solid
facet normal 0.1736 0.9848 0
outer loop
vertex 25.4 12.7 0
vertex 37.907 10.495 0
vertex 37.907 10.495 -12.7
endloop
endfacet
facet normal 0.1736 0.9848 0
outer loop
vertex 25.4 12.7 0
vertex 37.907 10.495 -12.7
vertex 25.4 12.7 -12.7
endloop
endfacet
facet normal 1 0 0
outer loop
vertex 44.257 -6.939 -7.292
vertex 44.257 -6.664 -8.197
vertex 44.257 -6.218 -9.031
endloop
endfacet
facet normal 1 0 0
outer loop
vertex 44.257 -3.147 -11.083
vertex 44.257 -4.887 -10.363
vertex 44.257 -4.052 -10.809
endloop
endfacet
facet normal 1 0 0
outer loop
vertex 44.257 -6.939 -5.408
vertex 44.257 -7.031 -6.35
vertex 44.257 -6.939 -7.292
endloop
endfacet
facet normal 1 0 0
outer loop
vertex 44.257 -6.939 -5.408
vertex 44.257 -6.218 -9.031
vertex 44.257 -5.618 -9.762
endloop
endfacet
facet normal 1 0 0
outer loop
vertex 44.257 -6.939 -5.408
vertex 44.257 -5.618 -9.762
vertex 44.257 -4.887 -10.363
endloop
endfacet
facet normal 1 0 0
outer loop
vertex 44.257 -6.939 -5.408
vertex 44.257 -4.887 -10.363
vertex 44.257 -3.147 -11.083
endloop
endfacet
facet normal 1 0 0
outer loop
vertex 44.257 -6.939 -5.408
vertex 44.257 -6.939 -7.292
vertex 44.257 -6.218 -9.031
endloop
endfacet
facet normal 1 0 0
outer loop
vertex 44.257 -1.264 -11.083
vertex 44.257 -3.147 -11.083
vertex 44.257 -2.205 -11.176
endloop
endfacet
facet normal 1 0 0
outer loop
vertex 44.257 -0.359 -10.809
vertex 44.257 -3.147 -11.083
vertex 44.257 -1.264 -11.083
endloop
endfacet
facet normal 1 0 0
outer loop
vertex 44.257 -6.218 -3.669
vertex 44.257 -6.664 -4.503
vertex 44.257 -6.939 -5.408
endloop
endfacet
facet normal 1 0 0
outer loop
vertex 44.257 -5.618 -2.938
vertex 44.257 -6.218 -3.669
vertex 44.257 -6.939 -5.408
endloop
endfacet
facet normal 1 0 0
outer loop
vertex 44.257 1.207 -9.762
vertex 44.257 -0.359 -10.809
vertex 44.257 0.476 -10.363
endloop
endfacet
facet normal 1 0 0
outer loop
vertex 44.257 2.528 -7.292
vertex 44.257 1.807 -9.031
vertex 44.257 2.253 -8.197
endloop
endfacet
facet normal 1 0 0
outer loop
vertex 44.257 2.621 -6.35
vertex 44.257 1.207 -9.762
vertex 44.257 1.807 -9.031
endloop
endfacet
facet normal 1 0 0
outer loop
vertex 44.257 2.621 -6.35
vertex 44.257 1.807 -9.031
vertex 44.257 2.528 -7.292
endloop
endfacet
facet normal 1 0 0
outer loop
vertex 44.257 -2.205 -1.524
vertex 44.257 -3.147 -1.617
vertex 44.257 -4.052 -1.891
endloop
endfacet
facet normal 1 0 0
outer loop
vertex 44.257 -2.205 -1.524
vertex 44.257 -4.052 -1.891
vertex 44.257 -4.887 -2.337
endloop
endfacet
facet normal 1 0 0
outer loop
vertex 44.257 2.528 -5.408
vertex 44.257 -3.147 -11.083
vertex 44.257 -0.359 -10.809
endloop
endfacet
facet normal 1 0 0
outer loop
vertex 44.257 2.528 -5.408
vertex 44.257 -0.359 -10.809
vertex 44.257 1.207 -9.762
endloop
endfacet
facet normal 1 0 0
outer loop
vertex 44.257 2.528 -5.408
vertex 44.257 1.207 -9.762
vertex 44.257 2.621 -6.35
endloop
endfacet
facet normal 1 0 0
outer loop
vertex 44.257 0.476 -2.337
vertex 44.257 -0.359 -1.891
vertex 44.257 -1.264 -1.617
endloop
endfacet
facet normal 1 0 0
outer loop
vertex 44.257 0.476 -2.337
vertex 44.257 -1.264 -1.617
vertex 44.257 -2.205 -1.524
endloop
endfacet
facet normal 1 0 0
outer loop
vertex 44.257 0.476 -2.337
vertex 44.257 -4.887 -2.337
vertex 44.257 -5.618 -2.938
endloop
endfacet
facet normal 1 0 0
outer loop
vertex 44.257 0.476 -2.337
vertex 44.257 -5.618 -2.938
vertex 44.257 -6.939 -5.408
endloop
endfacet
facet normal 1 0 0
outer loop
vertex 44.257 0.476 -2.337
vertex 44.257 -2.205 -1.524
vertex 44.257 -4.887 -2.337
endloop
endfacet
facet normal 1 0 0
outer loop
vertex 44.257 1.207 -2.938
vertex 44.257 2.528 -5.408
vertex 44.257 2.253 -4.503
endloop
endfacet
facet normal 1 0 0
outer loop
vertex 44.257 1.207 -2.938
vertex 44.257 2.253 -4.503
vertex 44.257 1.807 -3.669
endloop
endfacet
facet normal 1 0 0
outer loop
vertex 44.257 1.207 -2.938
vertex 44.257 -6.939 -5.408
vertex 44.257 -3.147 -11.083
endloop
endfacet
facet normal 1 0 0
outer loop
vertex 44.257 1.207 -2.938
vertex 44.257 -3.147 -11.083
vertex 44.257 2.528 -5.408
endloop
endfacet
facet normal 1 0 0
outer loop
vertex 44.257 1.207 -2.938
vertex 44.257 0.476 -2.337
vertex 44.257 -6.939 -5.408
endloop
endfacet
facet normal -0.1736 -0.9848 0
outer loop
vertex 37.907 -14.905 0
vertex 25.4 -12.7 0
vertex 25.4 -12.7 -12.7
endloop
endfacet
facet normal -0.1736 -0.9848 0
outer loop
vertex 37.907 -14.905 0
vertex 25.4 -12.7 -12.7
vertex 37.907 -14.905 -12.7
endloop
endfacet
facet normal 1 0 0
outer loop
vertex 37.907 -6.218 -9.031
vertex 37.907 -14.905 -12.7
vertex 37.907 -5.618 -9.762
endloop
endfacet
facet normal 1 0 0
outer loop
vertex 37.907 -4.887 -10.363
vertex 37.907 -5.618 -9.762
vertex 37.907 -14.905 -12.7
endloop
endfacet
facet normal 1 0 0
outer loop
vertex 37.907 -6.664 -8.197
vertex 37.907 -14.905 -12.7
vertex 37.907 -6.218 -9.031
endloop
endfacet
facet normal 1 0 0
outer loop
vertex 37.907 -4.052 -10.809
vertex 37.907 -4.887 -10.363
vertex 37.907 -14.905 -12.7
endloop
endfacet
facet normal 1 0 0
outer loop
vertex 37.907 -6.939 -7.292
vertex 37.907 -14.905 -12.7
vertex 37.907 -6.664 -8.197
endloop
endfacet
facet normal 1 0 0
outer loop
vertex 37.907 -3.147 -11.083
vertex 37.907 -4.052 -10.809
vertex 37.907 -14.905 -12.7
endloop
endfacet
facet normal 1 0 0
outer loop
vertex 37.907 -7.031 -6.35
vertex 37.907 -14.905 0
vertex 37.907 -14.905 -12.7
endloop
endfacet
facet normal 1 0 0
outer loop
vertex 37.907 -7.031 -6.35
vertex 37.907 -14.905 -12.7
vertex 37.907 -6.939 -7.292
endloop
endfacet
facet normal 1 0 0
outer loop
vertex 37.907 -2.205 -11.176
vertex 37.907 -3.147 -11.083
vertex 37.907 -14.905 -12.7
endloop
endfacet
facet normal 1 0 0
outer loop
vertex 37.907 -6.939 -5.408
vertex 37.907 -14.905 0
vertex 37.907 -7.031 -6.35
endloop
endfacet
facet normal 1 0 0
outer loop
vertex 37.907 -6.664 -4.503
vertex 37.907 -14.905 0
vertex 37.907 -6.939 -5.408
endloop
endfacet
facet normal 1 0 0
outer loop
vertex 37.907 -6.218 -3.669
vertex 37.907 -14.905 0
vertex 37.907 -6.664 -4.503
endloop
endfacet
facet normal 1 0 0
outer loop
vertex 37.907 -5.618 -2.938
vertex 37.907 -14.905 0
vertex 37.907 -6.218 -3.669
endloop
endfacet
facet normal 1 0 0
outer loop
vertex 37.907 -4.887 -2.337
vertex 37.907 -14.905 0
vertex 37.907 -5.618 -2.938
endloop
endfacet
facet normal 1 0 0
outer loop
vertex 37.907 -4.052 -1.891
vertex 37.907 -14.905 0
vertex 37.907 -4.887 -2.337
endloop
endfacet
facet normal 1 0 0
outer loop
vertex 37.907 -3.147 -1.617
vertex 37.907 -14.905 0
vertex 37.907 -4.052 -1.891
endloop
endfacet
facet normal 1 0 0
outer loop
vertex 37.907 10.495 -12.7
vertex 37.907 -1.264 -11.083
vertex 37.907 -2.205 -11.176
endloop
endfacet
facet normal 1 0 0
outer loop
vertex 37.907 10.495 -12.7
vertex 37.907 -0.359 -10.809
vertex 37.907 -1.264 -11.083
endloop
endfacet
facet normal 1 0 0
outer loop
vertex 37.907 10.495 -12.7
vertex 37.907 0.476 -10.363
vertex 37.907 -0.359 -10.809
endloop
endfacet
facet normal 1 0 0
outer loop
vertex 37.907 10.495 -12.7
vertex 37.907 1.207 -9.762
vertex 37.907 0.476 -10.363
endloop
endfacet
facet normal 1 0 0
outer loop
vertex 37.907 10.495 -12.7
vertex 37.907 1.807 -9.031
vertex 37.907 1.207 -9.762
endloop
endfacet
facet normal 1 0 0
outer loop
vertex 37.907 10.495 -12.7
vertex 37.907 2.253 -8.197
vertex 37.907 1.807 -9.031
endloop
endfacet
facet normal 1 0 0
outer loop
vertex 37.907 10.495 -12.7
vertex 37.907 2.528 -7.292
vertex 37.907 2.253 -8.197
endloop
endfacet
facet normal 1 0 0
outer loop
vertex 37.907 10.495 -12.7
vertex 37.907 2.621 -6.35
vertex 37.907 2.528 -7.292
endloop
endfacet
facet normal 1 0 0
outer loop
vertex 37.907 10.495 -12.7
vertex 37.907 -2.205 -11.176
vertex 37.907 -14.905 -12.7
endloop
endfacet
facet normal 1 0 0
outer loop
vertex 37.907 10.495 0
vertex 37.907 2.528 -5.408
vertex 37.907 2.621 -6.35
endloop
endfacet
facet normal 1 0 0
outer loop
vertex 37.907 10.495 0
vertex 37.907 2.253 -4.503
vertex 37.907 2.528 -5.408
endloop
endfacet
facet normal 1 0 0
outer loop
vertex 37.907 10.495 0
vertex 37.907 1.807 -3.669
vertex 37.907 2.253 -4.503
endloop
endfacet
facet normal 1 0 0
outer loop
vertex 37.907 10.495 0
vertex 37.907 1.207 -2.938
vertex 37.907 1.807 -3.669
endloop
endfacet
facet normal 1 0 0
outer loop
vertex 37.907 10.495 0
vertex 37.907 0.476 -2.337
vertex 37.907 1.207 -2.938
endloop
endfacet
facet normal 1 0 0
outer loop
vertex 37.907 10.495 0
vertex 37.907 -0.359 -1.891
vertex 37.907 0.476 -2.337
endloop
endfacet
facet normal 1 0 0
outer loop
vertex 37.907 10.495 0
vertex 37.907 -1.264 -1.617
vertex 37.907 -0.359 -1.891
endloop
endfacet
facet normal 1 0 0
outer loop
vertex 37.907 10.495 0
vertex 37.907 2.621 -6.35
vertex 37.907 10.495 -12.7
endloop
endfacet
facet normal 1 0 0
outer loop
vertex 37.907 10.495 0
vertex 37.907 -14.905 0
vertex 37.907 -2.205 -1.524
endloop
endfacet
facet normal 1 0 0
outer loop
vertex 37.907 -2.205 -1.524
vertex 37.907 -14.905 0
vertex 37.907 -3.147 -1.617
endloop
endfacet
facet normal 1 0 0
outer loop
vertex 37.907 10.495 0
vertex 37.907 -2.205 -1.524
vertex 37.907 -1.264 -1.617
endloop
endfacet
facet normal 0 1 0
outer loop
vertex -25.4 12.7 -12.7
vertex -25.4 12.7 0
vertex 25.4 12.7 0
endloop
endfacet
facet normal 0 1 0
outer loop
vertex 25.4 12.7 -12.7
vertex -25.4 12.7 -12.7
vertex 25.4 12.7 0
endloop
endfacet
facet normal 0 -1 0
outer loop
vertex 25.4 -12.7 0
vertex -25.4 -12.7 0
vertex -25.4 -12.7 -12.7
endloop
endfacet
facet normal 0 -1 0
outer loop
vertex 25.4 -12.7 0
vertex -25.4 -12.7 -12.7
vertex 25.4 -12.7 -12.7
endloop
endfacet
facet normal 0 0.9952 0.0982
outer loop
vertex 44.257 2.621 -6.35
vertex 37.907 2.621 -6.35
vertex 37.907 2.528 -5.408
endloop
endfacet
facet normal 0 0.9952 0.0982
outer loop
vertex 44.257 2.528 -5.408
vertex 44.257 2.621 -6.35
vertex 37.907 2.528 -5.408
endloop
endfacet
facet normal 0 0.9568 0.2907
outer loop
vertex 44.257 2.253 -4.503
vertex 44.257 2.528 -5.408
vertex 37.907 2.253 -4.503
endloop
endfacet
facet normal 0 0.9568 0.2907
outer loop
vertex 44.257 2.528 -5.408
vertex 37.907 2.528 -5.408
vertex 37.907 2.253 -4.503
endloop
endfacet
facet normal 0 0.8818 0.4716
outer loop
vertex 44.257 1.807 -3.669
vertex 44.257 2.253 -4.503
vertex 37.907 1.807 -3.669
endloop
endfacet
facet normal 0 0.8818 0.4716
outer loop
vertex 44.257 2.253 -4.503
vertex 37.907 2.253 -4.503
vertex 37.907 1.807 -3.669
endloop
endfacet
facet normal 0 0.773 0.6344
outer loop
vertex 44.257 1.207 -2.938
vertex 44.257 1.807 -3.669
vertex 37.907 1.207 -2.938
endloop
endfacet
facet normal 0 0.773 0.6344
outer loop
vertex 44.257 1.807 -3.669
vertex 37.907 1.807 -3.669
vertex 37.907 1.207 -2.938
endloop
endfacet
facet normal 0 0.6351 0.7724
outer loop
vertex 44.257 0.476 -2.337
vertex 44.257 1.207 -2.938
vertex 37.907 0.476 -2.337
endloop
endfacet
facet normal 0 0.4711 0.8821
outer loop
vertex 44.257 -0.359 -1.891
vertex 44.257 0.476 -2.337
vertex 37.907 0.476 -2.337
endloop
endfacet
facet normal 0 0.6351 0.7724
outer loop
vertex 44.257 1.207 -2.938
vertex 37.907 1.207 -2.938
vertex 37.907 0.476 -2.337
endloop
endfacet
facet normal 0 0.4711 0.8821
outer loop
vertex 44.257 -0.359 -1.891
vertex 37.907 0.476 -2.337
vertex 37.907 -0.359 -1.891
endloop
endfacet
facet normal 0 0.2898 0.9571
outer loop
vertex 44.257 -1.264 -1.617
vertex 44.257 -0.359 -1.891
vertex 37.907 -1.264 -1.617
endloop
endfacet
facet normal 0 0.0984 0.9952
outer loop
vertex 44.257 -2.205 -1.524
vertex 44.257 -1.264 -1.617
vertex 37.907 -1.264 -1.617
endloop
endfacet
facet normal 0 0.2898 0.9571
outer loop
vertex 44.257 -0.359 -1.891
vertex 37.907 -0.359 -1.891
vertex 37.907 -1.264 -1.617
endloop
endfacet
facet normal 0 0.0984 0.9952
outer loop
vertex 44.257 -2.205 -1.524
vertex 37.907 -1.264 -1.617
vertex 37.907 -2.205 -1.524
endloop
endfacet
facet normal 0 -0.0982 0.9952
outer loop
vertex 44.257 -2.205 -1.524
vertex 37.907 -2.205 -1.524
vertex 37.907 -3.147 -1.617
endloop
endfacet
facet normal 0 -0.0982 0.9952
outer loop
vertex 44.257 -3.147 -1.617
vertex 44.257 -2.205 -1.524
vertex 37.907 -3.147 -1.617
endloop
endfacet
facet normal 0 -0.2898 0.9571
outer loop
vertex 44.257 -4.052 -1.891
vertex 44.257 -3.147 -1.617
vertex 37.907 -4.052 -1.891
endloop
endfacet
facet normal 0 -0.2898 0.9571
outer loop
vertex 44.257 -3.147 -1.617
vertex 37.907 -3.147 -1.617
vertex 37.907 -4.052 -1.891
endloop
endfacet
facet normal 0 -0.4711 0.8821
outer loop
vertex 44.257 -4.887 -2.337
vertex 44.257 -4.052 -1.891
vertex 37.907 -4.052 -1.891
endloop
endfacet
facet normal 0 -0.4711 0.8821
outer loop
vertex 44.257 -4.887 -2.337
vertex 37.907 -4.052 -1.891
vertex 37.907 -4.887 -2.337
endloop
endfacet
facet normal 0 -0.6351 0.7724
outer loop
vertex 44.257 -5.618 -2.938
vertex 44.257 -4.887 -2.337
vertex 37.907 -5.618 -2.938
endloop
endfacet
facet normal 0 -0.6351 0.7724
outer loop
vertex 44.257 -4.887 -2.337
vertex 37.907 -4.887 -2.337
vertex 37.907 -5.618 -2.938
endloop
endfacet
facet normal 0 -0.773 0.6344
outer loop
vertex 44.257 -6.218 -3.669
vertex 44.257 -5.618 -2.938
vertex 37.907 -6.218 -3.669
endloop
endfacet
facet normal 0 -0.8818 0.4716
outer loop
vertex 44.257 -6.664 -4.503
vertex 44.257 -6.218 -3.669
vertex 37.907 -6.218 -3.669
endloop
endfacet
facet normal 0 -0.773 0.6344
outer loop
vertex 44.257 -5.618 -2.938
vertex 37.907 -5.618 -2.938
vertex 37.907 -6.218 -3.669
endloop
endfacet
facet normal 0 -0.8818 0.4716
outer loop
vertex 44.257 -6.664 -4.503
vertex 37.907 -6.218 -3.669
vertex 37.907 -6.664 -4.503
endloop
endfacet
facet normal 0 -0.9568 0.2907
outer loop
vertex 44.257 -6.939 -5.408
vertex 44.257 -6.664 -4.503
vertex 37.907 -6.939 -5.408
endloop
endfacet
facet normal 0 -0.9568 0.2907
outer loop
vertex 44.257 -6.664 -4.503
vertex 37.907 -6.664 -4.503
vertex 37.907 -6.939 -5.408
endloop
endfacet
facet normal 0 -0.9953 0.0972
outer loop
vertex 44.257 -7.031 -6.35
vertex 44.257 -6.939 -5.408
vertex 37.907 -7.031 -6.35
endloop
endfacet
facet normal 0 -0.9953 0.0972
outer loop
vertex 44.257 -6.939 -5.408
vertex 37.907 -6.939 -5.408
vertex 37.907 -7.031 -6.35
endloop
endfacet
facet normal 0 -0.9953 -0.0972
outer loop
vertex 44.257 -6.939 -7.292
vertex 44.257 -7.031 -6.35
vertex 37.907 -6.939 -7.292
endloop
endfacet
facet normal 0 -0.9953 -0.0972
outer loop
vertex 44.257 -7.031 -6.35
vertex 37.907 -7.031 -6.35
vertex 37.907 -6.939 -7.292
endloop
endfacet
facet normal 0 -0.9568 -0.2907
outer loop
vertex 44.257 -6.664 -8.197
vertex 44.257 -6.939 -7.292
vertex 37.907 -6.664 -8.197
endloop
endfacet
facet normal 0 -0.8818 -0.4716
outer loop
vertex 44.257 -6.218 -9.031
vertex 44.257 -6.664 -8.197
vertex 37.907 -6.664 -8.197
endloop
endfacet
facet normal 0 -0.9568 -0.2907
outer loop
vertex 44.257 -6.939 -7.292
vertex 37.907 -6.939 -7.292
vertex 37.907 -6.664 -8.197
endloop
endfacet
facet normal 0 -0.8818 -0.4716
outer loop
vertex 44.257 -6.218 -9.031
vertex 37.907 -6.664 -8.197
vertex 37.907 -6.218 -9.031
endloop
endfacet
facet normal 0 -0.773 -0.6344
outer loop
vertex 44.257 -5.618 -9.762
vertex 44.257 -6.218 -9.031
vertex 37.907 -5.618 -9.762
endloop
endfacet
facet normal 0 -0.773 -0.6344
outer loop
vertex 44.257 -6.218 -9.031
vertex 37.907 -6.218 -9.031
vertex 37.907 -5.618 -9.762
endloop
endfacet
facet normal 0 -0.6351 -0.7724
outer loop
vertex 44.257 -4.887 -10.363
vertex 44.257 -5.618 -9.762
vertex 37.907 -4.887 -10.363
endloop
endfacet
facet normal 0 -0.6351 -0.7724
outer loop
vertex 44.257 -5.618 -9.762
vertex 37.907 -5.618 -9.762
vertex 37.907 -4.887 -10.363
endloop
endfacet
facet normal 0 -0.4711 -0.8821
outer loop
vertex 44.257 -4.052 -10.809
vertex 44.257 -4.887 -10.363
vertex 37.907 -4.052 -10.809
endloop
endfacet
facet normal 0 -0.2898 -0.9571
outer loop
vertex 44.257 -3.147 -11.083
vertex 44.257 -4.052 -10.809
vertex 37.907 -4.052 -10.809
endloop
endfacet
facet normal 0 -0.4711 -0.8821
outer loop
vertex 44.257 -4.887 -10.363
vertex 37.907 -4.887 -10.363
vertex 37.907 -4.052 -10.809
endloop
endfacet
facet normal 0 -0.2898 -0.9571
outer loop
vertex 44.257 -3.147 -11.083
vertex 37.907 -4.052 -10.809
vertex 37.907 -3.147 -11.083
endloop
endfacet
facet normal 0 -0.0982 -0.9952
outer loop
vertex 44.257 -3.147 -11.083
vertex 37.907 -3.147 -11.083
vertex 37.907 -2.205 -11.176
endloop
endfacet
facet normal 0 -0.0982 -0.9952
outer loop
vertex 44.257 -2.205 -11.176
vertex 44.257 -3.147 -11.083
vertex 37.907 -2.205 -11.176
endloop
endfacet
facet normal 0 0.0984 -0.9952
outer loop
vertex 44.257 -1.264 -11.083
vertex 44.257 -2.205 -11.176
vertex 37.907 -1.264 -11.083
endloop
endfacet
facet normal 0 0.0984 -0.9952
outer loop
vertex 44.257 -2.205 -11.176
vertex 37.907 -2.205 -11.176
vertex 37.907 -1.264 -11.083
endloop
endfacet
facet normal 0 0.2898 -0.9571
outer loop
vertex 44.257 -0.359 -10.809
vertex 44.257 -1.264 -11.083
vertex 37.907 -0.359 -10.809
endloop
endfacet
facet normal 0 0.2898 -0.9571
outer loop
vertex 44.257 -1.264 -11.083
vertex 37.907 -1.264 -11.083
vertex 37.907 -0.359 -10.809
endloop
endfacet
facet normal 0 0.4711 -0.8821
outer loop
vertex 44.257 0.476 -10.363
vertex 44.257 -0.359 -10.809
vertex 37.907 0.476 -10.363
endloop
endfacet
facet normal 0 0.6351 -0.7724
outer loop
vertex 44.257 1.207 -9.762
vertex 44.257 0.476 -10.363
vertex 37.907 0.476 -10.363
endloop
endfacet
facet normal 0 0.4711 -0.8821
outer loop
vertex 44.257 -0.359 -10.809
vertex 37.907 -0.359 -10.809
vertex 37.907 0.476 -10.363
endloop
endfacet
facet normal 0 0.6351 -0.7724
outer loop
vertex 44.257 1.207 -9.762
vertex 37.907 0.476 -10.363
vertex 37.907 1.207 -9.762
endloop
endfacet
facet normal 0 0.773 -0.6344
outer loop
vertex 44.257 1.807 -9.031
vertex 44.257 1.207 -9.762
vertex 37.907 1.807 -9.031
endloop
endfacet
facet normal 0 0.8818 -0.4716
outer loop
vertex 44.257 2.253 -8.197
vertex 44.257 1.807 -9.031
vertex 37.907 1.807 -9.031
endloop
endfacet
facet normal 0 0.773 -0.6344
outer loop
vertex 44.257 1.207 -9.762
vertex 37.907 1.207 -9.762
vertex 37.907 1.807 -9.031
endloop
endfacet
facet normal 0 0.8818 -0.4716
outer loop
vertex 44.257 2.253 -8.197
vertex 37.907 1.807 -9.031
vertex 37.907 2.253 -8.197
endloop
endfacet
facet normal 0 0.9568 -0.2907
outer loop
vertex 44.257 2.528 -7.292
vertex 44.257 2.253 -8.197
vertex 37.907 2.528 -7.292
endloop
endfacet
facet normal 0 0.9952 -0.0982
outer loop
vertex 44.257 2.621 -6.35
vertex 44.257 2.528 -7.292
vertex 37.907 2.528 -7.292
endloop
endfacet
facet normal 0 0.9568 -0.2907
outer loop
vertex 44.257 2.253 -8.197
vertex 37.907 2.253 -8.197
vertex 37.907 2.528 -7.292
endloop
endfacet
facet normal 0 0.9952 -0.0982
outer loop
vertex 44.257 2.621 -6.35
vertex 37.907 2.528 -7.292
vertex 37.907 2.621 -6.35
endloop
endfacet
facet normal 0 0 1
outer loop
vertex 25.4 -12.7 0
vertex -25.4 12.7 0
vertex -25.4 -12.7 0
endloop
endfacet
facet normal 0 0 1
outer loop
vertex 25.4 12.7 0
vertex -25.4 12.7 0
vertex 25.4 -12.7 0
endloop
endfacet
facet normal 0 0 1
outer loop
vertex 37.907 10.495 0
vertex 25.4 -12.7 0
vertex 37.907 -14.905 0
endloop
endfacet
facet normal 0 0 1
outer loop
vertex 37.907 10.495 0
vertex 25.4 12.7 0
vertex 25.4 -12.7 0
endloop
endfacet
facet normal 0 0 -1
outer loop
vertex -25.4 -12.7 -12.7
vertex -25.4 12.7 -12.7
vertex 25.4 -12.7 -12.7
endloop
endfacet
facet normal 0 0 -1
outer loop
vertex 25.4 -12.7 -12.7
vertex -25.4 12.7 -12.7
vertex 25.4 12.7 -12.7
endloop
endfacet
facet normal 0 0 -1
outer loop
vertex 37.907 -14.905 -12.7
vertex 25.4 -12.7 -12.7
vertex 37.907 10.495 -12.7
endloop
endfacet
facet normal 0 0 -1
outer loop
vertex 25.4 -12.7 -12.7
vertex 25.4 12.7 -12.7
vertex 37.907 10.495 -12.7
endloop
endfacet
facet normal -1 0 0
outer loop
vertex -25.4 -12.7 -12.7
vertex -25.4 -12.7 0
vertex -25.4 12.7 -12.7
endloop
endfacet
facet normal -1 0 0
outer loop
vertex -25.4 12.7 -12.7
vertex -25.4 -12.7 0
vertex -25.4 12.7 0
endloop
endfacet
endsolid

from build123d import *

# Parameters (mm, degrees)
F0_W     = 50.8
F0_H     = 25.4
F1_DEPTH = 12.7
F2_R     = 4.826
F3_DEPTH = 6.35


# Not quite as in the source:
# - a feature names something its author has since deleted; it is built from what else it names


with BuildPart() as f1:
    # F0 (on Top) → F1 (new body)
    with BuildSketch(Plane.XY):
        Rectangle(F0_W, F0_H)
        Polygon((37.9070584633, 10.4946681436), (25.4, 12.7), (25.4, -12.7), (37.9070584633, -14.9053318564), (37.9070584633, -2.2053318564), align=None)
    extrude(amount=-F1_DEPTH)

    # F2 (on face) → F3 (join)
    with BuildSketch(Plane.YZ.offset(37.9070584633)):
        with Locations((-2.2053318564, -6.35)):
            Circle(F2_R)
    extrude(amount=F3_DEPTH)


solid = f1.part
